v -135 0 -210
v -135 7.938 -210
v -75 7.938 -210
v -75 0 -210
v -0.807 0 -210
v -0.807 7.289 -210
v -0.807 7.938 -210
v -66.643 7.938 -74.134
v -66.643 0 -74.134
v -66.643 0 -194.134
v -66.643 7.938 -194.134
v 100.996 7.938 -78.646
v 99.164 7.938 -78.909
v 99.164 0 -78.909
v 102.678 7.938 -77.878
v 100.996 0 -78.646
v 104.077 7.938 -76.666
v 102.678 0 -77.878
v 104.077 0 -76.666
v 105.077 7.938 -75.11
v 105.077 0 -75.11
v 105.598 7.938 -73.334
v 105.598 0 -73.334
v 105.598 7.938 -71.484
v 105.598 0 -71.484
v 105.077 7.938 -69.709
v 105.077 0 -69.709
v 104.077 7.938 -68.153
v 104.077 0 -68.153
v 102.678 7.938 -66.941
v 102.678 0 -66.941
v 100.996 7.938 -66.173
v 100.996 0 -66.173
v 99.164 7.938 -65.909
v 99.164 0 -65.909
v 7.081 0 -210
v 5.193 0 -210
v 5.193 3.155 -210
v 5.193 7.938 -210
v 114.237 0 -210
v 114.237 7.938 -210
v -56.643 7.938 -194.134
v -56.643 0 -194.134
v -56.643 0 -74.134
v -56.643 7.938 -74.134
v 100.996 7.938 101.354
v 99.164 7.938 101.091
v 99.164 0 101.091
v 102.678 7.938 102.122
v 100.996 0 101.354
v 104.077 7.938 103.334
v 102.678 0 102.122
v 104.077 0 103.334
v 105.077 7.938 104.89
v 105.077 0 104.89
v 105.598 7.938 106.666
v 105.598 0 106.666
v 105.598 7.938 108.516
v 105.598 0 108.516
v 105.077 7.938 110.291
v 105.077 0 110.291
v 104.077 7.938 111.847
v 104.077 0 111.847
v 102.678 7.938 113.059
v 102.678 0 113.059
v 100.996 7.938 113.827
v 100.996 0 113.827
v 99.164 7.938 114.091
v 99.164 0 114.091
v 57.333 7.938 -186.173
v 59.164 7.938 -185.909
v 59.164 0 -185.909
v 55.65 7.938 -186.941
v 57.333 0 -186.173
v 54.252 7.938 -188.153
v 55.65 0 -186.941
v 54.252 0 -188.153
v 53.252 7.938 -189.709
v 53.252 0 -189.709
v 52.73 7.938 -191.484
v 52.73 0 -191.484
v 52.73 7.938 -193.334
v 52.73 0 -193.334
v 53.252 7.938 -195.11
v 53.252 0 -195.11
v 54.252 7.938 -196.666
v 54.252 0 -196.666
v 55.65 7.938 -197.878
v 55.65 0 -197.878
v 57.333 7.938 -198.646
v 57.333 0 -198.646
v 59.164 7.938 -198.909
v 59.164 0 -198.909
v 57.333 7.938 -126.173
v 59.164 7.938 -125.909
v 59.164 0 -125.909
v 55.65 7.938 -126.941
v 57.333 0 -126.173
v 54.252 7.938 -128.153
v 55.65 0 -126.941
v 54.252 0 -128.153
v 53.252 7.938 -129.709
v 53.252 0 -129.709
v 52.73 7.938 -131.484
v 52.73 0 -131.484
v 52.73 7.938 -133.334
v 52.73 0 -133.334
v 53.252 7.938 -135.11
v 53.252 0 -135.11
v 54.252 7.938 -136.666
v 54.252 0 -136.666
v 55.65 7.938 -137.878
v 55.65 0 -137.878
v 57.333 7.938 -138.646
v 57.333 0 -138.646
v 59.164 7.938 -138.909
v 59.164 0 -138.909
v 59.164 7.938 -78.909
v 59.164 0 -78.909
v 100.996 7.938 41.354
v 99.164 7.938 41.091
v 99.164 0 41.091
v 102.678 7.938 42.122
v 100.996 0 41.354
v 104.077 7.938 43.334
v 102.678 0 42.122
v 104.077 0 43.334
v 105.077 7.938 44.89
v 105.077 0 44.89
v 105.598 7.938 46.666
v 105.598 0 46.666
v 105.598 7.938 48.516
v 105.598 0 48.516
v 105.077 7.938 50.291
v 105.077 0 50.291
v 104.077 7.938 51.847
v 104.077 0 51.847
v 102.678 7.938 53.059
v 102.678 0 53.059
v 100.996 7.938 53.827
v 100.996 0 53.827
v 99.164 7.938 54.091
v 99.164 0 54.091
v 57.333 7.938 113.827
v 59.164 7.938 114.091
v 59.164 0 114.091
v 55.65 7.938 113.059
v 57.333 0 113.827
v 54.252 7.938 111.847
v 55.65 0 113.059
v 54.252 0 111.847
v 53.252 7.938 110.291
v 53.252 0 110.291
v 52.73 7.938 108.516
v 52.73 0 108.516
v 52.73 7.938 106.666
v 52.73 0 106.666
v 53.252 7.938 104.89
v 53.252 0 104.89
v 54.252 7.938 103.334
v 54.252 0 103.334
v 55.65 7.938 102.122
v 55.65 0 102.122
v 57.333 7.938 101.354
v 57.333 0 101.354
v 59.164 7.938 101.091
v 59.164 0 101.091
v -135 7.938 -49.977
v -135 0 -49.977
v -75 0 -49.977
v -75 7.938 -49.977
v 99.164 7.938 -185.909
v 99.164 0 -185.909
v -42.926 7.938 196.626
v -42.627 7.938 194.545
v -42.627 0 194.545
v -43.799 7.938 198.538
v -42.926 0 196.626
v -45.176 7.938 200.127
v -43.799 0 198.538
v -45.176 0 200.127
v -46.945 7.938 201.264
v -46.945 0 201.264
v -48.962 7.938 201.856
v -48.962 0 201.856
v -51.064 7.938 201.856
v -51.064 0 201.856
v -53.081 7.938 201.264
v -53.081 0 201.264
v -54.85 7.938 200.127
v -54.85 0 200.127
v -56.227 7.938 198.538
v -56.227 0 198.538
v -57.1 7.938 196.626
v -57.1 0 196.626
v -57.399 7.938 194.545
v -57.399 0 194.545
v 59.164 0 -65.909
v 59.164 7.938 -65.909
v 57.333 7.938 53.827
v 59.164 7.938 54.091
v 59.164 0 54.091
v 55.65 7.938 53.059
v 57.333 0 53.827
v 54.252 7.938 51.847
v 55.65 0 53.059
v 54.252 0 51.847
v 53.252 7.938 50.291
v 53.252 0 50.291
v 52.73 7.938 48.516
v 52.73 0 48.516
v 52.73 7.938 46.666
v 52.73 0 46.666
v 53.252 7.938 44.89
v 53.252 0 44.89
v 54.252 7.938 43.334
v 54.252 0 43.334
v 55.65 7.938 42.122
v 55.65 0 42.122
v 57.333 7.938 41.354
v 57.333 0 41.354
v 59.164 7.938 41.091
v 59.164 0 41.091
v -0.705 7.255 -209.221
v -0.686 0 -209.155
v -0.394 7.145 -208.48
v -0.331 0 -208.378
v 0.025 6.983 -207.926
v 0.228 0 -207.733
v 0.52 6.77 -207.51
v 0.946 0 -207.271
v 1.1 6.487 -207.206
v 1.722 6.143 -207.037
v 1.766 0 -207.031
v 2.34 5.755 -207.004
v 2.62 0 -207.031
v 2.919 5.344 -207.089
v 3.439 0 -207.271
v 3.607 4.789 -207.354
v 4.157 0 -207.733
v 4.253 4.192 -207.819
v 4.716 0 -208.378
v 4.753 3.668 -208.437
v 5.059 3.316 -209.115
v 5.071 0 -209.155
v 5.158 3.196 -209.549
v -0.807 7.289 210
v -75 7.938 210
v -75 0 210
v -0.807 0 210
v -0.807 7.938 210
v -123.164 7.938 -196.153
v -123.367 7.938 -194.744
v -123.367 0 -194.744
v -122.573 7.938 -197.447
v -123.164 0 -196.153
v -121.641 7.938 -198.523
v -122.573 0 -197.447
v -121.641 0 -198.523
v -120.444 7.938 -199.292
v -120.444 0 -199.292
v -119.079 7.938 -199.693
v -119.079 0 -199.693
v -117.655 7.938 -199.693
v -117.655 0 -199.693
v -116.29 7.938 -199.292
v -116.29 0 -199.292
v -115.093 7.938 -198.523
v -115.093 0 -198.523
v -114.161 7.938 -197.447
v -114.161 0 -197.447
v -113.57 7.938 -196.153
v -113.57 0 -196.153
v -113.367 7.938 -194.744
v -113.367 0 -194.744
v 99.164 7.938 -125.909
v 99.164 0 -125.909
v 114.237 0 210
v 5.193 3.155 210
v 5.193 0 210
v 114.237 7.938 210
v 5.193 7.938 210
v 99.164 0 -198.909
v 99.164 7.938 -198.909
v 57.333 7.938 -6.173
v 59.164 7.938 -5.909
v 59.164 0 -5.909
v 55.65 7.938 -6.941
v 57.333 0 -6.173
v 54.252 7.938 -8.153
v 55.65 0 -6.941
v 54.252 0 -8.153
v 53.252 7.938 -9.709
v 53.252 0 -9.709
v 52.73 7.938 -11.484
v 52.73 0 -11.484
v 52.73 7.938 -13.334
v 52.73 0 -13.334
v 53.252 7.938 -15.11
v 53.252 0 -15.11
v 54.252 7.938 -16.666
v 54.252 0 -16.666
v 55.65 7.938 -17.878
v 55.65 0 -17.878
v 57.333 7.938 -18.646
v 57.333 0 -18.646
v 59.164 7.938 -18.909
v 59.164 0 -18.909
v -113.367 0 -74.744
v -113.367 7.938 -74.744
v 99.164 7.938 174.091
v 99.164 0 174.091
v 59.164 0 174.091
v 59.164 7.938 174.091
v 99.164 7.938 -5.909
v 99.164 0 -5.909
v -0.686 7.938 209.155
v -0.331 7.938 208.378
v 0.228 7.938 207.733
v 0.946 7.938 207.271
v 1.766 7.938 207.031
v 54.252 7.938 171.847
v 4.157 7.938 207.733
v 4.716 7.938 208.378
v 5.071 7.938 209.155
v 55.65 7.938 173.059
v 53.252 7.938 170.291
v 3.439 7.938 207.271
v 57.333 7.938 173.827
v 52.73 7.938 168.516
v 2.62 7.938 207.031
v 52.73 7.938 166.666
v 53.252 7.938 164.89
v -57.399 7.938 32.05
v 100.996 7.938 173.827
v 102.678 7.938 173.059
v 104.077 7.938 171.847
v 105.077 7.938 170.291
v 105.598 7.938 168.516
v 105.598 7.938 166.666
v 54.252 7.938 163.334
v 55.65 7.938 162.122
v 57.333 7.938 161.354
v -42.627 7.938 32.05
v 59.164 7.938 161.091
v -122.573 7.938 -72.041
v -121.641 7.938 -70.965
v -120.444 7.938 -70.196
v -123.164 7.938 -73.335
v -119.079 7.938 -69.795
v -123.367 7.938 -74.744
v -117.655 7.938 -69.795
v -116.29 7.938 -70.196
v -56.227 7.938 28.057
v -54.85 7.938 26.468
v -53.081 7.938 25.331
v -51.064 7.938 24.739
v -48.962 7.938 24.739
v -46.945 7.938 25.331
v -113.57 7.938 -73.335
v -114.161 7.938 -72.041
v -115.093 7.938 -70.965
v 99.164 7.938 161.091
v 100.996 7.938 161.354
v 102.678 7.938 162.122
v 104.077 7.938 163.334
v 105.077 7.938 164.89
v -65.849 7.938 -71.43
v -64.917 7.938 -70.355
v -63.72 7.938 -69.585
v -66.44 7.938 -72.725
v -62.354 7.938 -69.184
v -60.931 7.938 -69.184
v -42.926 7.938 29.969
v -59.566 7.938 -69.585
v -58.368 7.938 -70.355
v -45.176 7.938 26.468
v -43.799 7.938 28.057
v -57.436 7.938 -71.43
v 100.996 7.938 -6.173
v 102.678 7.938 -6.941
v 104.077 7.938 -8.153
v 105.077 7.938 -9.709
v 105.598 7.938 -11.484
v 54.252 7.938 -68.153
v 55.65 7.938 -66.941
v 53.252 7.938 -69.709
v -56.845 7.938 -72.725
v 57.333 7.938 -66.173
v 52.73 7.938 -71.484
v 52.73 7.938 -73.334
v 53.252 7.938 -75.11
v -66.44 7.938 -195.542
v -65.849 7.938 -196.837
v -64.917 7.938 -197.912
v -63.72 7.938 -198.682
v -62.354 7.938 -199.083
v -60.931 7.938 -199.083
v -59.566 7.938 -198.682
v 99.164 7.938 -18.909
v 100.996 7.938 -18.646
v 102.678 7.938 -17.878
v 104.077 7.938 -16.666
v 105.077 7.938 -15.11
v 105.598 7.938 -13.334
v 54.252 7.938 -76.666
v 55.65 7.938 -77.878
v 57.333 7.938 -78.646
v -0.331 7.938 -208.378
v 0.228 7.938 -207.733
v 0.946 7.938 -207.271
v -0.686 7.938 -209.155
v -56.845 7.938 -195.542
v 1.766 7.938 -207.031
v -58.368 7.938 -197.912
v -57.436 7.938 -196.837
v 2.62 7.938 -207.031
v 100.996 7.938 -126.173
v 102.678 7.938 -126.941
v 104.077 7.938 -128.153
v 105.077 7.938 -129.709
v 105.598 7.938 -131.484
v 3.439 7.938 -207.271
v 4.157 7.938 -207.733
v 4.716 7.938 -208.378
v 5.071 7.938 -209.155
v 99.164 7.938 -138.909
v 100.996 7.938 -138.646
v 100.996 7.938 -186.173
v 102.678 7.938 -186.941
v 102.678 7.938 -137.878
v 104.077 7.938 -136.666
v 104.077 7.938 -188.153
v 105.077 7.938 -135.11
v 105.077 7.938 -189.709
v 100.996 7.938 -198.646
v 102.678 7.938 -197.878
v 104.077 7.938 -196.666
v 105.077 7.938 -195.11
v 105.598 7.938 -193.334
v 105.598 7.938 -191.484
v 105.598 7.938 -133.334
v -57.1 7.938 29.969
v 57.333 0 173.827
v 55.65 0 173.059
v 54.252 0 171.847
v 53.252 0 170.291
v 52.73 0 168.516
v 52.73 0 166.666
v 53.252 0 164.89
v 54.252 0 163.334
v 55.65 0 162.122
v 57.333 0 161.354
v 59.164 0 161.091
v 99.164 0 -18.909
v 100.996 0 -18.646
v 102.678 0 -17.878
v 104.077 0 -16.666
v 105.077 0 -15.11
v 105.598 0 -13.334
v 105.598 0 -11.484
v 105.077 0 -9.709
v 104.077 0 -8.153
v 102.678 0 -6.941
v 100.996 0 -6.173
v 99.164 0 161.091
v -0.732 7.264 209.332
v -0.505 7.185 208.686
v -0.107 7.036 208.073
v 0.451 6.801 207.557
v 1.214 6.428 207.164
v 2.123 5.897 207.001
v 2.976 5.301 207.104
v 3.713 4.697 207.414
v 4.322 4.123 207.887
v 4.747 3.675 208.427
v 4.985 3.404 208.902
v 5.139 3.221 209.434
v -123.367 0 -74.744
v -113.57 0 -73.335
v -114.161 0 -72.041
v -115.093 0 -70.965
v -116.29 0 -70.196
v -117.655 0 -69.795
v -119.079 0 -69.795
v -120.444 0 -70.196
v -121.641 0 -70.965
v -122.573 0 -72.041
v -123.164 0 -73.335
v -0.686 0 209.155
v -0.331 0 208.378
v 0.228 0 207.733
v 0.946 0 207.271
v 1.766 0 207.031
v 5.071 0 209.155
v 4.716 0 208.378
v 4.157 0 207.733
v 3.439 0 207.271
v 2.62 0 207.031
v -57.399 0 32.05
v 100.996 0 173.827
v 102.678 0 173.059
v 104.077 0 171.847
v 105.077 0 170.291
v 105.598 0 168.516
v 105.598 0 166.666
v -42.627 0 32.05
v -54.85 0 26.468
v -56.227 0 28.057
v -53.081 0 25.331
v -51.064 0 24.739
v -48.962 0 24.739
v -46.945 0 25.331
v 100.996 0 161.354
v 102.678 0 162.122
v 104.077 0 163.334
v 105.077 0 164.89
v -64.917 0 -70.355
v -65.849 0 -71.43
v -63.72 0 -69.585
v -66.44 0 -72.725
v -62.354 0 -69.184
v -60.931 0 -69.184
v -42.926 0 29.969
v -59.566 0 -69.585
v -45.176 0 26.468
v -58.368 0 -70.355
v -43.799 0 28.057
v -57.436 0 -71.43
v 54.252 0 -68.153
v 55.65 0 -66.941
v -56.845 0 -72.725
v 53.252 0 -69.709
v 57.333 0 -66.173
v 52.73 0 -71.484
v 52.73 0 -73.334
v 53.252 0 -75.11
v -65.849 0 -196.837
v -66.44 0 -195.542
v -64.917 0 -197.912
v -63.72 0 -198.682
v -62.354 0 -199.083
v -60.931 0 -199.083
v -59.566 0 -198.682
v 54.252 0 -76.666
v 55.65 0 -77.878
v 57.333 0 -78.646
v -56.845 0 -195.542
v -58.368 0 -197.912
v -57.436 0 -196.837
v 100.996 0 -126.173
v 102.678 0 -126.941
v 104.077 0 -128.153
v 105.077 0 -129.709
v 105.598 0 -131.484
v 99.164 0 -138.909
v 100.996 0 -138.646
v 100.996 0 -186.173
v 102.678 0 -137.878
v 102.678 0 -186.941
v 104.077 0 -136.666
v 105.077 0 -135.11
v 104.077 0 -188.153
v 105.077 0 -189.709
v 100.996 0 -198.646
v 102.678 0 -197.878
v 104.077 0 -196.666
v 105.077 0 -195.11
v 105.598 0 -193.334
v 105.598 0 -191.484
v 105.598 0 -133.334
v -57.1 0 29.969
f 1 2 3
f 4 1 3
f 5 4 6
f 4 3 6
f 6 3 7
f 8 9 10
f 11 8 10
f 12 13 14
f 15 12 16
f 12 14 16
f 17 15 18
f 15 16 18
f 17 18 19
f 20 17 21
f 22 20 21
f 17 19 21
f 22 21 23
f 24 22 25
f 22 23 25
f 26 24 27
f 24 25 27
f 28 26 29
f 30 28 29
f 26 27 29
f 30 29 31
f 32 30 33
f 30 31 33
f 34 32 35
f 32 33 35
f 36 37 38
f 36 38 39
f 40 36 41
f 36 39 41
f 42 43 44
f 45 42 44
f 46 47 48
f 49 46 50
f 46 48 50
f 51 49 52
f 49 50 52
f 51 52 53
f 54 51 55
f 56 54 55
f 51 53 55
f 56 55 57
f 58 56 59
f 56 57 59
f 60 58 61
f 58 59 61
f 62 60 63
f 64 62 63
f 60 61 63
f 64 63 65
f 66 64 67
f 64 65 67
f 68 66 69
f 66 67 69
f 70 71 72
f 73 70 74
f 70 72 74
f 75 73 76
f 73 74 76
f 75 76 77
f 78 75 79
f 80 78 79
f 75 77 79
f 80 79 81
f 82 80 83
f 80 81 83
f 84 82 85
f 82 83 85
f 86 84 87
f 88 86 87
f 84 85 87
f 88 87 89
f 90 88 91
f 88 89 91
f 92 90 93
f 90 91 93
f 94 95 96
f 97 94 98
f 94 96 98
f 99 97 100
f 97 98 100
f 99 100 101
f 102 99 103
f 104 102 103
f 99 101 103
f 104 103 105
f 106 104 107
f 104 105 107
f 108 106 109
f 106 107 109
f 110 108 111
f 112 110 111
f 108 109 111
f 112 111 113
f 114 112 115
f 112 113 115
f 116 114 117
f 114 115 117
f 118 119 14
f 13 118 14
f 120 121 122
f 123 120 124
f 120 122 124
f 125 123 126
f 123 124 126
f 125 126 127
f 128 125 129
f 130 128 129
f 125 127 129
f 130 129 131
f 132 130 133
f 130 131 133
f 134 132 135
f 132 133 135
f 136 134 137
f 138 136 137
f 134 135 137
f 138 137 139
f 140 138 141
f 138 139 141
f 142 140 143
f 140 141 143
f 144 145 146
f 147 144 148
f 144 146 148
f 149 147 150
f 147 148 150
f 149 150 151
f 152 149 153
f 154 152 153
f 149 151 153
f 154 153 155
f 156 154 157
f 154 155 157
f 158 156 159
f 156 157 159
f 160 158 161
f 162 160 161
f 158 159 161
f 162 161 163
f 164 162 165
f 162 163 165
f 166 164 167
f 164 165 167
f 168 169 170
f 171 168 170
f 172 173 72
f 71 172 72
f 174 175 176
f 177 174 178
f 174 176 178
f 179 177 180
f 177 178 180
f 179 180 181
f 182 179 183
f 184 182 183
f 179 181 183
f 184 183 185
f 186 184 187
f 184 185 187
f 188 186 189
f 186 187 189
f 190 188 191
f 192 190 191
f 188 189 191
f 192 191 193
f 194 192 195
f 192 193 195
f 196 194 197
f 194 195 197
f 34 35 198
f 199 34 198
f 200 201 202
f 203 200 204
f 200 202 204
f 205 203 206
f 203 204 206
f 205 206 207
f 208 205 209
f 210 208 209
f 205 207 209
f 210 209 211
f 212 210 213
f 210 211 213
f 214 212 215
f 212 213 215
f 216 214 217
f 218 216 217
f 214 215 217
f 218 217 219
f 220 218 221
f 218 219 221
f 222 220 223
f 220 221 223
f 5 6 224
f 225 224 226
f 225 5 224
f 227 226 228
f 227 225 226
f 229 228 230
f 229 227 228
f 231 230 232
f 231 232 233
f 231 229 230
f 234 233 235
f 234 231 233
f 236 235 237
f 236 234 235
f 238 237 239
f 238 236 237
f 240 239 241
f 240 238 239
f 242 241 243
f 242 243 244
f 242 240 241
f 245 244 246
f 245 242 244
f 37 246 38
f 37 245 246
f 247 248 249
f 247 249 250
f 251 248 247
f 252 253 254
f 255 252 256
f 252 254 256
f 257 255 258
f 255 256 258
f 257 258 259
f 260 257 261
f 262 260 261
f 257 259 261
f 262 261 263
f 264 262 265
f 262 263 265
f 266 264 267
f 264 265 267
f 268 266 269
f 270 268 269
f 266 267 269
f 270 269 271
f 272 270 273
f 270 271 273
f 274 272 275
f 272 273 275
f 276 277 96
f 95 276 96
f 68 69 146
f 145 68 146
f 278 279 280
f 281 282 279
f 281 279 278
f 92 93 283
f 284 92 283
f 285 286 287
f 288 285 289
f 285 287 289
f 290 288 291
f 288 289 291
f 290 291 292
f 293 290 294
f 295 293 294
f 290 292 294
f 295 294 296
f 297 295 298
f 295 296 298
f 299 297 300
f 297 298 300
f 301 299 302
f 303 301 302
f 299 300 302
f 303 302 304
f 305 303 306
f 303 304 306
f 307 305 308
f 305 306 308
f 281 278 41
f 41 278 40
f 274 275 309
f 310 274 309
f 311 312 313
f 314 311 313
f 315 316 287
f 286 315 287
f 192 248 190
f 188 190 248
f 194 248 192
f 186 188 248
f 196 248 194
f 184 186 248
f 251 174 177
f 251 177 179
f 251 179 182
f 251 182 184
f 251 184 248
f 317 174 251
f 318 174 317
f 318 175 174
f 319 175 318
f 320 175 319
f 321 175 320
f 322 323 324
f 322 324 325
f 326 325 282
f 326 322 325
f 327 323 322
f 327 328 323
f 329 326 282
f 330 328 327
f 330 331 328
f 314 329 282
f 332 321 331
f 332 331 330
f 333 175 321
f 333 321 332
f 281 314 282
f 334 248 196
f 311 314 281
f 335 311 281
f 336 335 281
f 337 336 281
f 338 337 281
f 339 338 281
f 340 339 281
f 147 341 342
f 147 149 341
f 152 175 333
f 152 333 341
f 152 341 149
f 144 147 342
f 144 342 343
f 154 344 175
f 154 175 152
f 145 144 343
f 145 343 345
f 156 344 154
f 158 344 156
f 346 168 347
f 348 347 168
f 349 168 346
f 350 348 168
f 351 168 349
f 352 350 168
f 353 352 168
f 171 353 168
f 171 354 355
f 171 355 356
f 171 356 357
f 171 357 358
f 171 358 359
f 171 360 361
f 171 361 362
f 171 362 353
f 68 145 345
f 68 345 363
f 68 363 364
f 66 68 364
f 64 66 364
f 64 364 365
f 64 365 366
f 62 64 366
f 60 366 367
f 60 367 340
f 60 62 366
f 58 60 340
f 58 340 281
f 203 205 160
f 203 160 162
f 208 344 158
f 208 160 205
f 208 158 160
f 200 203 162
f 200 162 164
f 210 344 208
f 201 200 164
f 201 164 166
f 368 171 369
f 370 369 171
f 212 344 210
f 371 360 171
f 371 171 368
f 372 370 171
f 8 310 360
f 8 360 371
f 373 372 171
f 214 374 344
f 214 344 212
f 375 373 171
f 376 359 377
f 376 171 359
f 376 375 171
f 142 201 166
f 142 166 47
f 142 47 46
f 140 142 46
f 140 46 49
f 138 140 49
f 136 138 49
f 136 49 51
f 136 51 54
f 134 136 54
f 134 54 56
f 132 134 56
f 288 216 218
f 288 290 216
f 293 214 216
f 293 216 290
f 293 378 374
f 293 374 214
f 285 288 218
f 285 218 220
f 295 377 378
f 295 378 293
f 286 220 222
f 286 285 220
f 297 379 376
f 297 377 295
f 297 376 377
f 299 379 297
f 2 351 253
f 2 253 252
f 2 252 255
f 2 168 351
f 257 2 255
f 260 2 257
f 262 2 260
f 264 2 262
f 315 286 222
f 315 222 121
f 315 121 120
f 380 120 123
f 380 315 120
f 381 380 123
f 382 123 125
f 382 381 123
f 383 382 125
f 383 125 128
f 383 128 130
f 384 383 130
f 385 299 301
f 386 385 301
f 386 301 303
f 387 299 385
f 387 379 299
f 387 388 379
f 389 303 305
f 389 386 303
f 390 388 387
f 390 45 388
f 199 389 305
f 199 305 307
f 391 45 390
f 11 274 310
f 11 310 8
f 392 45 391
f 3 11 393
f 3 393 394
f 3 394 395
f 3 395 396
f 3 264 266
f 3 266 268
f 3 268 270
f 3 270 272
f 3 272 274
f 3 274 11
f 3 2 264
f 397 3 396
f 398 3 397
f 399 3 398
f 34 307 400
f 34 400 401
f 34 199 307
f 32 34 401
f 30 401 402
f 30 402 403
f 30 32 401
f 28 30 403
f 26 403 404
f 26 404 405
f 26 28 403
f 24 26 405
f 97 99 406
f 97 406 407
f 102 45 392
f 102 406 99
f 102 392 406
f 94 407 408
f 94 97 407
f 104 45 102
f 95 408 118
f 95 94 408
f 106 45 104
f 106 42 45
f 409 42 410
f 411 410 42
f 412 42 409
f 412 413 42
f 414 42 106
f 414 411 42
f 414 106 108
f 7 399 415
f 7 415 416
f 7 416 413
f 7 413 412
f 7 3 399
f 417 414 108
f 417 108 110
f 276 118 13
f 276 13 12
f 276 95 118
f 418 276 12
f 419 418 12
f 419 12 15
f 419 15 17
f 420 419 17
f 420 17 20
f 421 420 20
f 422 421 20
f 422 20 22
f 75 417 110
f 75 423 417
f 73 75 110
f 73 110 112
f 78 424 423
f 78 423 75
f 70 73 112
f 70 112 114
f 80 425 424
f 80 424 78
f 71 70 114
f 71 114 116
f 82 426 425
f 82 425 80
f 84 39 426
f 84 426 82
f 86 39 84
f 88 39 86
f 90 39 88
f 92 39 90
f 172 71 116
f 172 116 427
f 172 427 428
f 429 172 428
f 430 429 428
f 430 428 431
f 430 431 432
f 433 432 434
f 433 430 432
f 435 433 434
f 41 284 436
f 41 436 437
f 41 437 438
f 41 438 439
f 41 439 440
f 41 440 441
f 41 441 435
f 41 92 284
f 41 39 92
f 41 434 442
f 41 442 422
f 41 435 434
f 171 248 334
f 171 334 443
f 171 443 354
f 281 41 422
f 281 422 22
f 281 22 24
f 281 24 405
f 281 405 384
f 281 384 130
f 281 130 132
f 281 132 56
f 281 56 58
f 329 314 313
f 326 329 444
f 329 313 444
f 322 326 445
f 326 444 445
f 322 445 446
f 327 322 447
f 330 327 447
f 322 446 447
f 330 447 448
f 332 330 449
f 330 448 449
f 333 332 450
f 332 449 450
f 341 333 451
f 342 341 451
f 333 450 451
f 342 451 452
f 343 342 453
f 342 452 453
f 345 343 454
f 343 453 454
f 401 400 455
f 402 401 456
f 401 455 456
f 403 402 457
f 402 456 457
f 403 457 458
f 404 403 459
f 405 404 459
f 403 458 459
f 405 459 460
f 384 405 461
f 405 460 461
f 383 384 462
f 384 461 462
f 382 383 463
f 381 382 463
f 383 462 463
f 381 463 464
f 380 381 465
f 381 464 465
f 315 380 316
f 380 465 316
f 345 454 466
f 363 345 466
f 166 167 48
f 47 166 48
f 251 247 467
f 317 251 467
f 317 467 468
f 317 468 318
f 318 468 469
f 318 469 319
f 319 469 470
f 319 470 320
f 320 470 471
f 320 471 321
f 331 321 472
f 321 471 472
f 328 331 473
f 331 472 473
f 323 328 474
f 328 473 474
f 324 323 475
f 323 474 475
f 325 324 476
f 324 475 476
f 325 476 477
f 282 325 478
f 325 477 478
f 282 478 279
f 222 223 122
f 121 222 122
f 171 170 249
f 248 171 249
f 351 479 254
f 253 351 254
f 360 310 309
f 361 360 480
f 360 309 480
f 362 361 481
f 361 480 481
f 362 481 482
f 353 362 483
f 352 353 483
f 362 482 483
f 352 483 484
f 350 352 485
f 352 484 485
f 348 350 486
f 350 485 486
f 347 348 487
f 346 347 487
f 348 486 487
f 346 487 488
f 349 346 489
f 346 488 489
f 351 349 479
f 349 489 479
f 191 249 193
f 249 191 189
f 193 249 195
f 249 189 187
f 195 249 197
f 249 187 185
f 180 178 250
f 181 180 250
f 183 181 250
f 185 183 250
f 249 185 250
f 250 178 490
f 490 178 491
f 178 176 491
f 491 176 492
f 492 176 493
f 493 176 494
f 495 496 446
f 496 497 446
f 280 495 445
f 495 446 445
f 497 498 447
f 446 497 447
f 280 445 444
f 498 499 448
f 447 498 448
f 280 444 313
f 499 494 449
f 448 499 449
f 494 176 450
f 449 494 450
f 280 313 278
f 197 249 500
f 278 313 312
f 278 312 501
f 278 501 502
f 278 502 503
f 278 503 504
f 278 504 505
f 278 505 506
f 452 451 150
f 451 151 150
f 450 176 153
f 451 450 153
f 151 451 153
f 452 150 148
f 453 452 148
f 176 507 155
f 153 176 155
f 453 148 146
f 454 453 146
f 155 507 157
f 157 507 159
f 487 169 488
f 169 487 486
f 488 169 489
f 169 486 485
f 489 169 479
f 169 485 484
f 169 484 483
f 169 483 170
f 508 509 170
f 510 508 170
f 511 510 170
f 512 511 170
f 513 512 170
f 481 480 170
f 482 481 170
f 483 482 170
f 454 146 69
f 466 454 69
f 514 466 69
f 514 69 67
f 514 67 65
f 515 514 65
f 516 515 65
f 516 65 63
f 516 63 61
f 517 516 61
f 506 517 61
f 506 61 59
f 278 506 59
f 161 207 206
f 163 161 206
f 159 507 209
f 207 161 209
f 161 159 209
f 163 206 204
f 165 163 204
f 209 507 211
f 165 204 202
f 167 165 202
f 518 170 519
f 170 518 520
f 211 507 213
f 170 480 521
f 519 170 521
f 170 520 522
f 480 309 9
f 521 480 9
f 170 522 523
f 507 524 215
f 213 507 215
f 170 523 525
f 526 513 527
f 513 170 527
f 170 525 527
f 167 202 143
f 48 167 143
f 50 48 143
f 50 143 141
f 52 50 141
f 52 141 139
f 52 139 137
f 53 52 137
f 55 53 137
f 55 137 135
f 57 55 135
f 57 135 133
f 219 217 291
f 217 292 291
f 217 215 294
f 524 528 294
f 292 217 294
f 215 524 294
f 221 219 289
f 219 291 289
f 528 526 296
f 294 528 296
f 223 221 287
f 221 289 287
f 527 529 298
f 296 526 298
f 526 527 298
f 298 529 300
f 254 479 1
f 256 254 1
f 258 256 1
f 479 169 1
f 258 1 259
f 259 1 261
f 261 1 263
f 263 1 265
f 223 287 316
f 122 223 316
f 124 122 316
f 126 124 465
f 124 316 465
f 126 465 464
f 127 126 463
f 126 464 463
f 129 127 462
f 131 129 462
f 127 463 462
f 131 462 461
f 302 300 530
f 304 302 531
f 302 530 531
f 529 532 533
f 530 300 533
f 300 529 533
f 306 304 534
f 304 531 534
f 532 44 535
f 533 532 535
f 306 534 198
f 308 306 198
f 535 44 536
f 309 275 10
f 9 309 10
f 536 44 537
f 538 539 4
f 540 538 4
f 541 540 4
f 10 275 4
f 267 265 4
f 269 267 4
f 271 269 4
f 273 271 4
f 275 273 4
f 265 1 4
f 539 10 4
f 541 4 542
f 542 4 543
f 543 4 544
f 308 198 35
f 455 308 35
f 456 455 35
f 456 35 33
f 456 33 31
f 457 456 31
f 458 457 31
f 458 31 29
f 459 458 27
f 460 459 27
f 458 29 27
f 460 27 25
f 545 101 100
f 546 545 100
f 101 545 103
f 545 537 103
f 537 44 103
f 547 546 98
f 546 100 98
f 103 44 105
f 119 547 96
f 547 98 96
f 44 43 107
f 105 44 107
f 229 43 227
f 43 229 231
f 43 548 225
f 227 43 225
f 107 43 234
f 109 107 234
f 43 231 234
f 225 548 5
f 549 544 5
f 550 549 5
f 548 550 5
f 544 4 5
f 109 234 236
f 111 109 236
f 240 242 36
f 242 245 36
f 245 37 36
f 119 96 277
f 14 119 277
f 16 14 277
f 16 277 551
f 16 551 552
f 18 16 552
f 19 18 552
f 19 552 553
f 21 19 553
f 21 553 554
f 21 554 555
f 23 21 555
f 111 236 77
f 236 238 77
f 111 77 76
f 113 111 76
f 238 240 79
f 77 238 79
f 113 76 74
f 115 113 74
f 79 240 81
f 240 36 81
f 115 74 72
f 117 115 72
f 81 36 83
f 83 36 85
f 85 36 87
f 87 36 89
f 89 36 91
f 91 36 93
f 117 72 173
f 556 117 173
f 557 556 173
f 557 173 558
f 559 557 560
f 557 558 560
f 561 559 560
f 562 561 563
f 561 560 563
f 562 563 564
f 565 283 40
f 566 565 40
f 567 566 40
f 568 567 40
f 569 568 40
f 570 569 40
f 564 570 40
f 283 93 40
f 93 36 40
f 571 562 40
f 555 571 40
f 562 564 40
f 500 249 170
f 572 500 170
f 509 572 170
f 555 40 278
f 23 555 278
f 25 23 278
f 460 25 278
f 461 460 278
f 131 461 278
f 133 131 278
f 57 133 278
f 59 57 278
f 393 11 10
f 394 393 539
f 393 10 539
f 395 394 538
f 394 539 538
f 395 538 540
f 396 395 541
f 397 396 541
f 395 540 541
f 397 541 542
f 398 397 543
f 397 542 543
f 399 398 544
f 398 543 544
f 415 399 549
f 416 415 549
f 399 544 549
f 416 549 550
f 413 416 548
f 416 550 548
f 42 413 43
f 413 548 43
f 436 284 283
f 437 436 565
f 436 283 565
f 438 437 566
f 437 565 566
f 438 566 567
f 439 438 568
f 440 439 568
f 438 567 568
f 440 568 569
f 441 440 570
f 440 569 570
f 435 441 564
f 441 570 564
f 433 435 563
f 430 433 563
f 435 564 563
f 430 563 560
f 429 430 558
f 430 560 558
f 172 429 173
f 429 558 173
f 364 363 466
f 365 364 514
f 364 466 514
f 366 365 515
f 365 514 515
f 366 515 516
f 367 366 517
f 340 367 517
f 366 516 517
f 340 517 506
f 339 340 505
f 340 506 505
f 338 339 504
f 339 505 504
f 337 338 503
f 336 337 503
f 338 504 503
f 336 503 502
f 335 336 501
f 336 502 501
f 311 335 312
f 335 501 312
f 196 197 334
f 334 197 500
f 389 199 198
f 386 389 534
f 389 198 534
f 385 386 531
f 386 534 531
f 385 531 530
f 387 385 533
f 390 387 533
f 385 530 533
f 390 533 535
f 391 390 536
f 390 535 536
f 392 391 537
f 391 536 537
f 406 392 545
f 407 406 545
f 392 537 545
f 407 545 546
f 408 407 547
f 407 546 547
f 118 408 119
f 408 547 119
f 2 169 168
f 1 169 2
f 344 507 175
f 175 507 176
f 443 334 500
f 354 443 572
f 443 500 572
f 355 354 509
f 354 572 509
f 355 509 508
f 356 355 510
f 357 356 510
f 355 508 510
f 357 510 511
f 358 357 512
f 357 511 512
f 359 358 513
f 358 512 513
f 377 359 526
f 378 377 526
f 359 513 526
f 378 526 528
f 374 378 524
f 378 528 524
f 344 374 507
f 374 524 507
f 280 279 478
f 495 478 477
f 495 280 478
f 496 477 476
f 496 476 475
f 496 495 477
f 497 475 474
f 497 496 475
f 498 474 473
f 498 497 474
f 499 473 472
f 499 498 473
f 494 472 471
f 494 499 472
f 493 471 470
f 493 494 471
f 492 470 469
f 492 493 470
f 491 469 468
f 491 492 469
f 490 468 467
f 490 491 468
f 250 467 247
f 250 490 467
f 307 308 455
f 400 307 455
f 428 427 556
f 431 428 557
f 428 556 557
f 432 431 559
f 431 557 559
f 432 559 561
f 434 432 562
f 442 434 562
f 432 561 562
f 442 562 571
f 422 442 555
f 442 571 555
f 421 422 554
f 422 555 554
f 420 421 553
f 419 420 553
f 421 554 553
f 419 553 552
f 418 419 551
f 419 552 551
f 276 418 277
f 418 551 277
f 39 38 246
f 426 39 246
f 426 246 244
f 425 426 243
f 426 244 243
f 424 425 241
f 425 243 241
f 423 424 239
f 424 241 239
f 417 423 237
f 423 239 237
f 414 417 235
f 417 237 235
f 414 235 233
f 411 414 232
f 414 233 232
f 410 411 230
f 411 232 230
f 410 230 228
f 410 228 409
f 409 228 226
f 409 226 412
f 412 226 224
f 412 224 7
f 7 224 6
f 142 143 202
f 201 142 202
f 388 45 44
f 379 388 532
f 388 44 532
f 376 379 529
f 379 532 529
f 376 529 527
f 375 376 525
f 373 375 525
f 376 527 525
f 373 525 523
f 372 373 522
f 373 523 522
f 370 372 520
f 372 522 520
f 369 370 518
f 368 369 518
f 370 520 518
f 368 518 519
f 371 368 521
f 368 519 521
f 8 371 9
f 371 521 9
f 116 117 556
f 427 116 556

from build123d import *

# Parameters (mm, degrees)
CROQUIS1_W                = 60
CROQUIS1_H                = 160.023288417
SALIENTE_EXTRUIR1_DEPTH   = 7.9375
CROQUIS2_W                = 8.086078182
CROQUIS2_H                = 420
SALIENTE_EXTRUIR2_DEPTH   = 110
CORTAR_EXTRUIR1_DEPTH     = 10
CROQUIS4_W                = 184.389639933
CROQUIS4_H                = 520.028204804
CORTAR_EXTRUIR2_DEPTH     = 10
CONVERTIR_S_LIDO1_START   = -210
CONVERTIR_S_LIDO1_DEPTH   = 420
CONVERTIR_S_LIDO1_2_DEPTH = 420
CORTAR_EXTRUIR3_START     = -117.9375
CORTAR_EXTRUIR3_OUTLINE_W = 14.086078182
CORTAR_EXTRUIR3_OUTLINE_H = 420
CORTAR_EXTRUIR3_DEPTH     = 110
CORTAR_EXTRUIR3_START_2   = -7.9375
CORTAR_EXTRUIR3_2_DEPTH   = 7.9375
CORTAR_EXTRUIR3_3_DEPTH   = 7.9375


# Read off the part's stored shape, not the designer's step: Convertir-Sólido1, Cortar-Extruir3
with BuildPart() as part:
    # Croquis1 → Saliente-Extruir1 (new body)
    # profile 1 of 2: a face of its own
    with BuildSketch(Plane(origin=(0, 0, 0), x_dir=(1, 0, 0), z_dir=(0, 1, 0))):
        Polygon((75, 210), (-75, 210), (-75, 49.976711583), (-75, -210), (75, -210), align=None)
        with BuildLine():
            Line((-57.399097033, -162.050045053), (-57.399097033, -64.544827159))
            Line((-57.399097033, -64.544827159), (-57.399097033, -32.050045053))
            ThreePointArc((-57.399097033, -32.050045053), (-50.012947046, -24.663895066), (-42.626797059, -32.050045053))
            Line((-42.626797059, -32.050045053), (-42.626797059, -64.544827159))
            Line((-42.626797059, -64.544827159), (-42.626797059, -162.050045053))
            Line((-42.626797059, -162.050045053), (-42.626797059, -194.544827159))
            ThreePointArc((-42.626797059, -194.544827159), (-50.012947046, -201.930977146), (-57.399097033, -194.544827159))
            Line((-57.399097033, -194.544827159), (-57.399097033, -162.050045053))
        make_face(mode=Mode.SUBTRACT)
        with BuildLine():
            ThreePointArc((57.373202941, -194.544827159), (49.987052954, -201.930977146), (42.600902967, -194.544827159))
            Line((42.600902967, -194.544827159), (42.600902967, -162.050045053))
            ThreePointArc((42.600902967, -162.050045053), (49.987052954, -154.663895066), (57.373202941, -162.050045053))
            Line((57.373202941, -162.050045053), (57.373202941, -194.544827159))
        make_face(mode=Mode.SUBTRACT)
        with BuildLine():
            ThreePointArc((57.373202941, -64.544827159), (49.987052954, -71.930977146), (42.600902967, -64.544827159))
            Line((42.600902967, -64.544827159), (42.600902967, -32.050045053))
            ThreePointArc((42.600902967, -32.050045053), (49.987052954, -24.663895066), (57.373202941, -32.050045053))
            Line((57.373202941, -32.050045053), (57.373202941, -64.544827159))
        make_face(mode=Mode.SUBTRACT)
        with BuildLine():
            ThreePointArc((-66.642728039, 194.133584854), (-61.642728039, 199.133584854), (-56.642728039, 194.133584854))
            Line((-56.642728039, 194.133584854), (-56.642728039, 74.133584854))
            ThreePointArc((-56.642728039, 74.133584854), (-61.642728039, 69.133584854), (-66.642728039, 74.133584854))
            Line((-66.642728039, 74.133584854), (-66.642728039, 194.133584854))
        make_face(mode=Mode.SUBTRACT)
    # profile 2 of 2: a face of its own
    with BuildSketch(Plane(origin=(0, 0, 0), x_dir=(1, 0, 0), z_dir=(0, 1, 0))):
        with Locations((-105, 129.988355791)):
            Rectangle(CROQUIS1_W, CROQUIS1_H)
        with BuildLine():
            ThreePointArc((-123.366972213, 194.743931483), (-118.366972213, 199.743931483), (-113.366972213, 194.743931483))
            Line((-113.366972213, 194.743931483), (-113.366972213, 74.743931483))
            ThreePointArc((-113.366972213, 74.743931483), (-118.366972213, 69.743931483), (-123.366972213, 74.743931483))
            Line((-123.366972213, 74.743931483), (-123.366972213, 194.743931483))
        make_face(mode=Mode.SUBTRACT)
    extrude(amount=SALIENTE_EXTRUIR1_DEPTH)

    # Croquis2 → Saliente-Extruir2 (add)
    with BuildSketch(Plane.XZ):
        with Locations((4.043039091, 0)):
            Rectangle(CROQUIS2_W, CROQUIS2_H)
    extrude(amount=SALIENTE_EXTRUIR2_DEPTH)

    # Croquis3 → Cortar-Extruir1 (cut)
    with BuildSketch(Plane.ZY):
        with BuildLine():
            Line((-185.90944112, -54.927638628), (-185.90944112, -94.927638628))
            ThreePointArc((-185.90944112, -94.927638628), (-192.40944112, -101.427638628), (-198.90944112, -94.927638628))
            Line((-198.90944112, -94.927638628), (-198.90944112, -54.927638628))
            ThreePointArc((-198.90944112, -54.927638628), (-192.40944112, -48.427638628), (-185.90944112, -54.927638628))
        make_face()
        with BuildLine():
            Line((-125.90944112, -54.927638628), (-125.90944112, -94.927638628))
            ThreePointArc((-125.90944112, -94.927638628), (-132.40944112, -101.427638628), (-138.90944112, -94.927638628))
            Line((-138.90944112, -94.927638628), (-138.90944112, -54.927638628))
            ThreePointArc((-138.90944112, -54.927638628), (-132.40944112, -48.427638628), (-125.90944112, -54.927638628))
        make_face()
        with BuildLine():
            Line((-65.90944112, -54.927638628), (-65.90944112, -94.927638628))
            ThreePointArc((-65.90944112, -94.927638628), (-72.40944112, -101.427638628), (-78.90944112, -94.927638628))
            Line((-78.90944112, -94.927638628), (-78.90944112, -54.927638628))
            ThreePointArc((-78.90944112, -54.927638628), (-72.40944112, -48.427638628), (-65.90944112, -54.927638628))
        make_face()
        with BuildLine():
            Line((-5.90944112, -54.927638628), (-5.90944112, -94.927638628))
            ThreePointArc((-5.90944112, -94.927638628), (-12.40944112, -101.427638628), (-18.90944112, -94.927638628))
            Line((-18.90944112, -94.927638628), (-18.90944112, -54.927638628))
            ThreePointArc((-18.90944112, -54.927638628), (-12.40944112, -48.427638628), (-5.90944112, -54.927638628))
        make_face()
        with BuildLine():
            Line((54.09055888, -54.927638628), (54.09055888, -94.927638628))
            ThreePointArc((54.09055888, -94.927638628), (47.59055888, -101.427638628), (41.09055888, -94.927638628))
            Line((41.09055888, -94.927638628), (41.09055888, -54.927638628))
            ThreePointArc((41.09055888, -54.927638628), (47.59055888, -48.427638628), (54.09055888, -54.927638628))
        make_face()
        with BuildLine():
            Line((114.09055888, -54.927638628), (114.09055888, -94.927638628))
            ThreePointArc((114.09055888, -94.927638628), (107.59055888, -101.427638628), (101.09055888, -94.927638628))
            Line((101.09055888, -94.927638628), (101.09055888, -54.927638628))
            ThreePointArc((101.09055888, -54.927638628), (107.59055888, -48.427638628), (114.09055888, -54.927638628))
        make_face()
        with BuildLine():
            Line((174.09055888, -54.927638628), (174.09055888, -94.927638628))
            ThreePointArc((174.09055888, -94.927638628), (167.59055888, -101.427638628), (161.09055888, -94.927638628))
            Line((161.09055888, -94.927638628), (161.09055888, -54.927638628))
            ThreePointArc((161.09055888, -54.927638628), (167.59055888, -48.427638628), (174.09055888, -54.927638628))
        make_face()
    extrude(amount=-CORTAR_EXTRUIR1_DEPTH, mode=Mode.SUBTRACT)

    # Croquis4 → Cortar-Extruir2 (cut)
    with BuildSketch(Plane.XZ):
        with Locations((100.280898149, 50.014102402)):
            Rectangle(CROQUIS4_W, CROQUIS4_H)
    extrude(amount=-CORTAR_EXTRUIR2_DEPTH, mode=Mode.SUBTRACT)

    # Convertir-Sólido1 outline → Convertir-Sólido1 (cut)
    with BuildSketch(Plane.XY.offset(CONVERTIR_S_LIDO1_START)):
        with BuildLine():
            Line((8.086078182, 7.9375), (-4.851421818, 7.9375))
            ThreePointArc((-4.851421818, 7.9375), (4.296772164, 4.148193982), (8.086078182, -5))
            Line((8.086078182, -5), (8.086078182, 7.9375))
        make_face()
        with BuildLine():
            Line((0, -110), (0.148578182, -110))
            Line((0.148578182, -110), (0.148578182, -5))
            ThreePointArc((0.148578182, -5), (0.11129463, -4.390536748), (0, -3.790162679))
            Line((0, -3.790162679), (0, -110))
        make_face()
    extrude(amount=CONVERTIR_S_LIDO1_DEPTH, mode=Mode.SUBTRACT)

    # Convertir-S_lido1 2 outline → Convertir-S_lido1 2 (add)
    with BuildSketch(Plane.XY.offset(CONVERTIR_S_LIDO1_START)):
        with BuildLine():
            ThreePointArc((-4.851421818, 0), (-1.773206962, -1.059873948), (0, -3.790162679))
            Line((0, -3.790162679), (0, 0))
            Line((0, 0), (-4.851421818, 0))
        make_face()
    extrude(amount=CONVERTIR_S_LIDO1_2_DEPTH)

    # Cortar-Extruir3 outline → Cortar-Extruir3 (cut)
    with BuildSketch(Plane(origin=(0, 7.9375, 0), x_dir=(1, 0, 0), z_dir=(0, 1, 0)).offset(CORTAR_EXTRUIR3_START)):
        with Locations((1.043039091, 0)):
            Rectangle(CORTAR_EXTRUIR3_OUTLINE_W, CORTAR_EXTRUIR3_OUTLINE_H)
    extrude(amount=CORTAR_EXTRUIR3_DEPTH, mode=Mode.SUBTRACT)

    # Cortar-Extruir3 2 outline → Cortar-Extruir3 2 (cut)
    with BuildSketch(Plane(origin=(0, 7.9375, 0), x_dir=(1, 0, 0), z_dir=(0, 1, 0)).offset(CORTAR_EXTRUIR3_START_2)):
        with BuildLine():
            Line((5.19261796, 210), (-0.80738204, 210))
            ThreePointArc((-0.80738204, 210), (2.19261796, 207), (5.19261796, 210))
        make_face()
        with BuildLine():
            Line((-0.80738204, -210), (5.19261796, -210))
            ThreePointArc((5.19261796, -210), (2.19261796, -207), (-0.80738204, -210))
        make_face()
    extrude(amount=CORTAR_EXTRUIR3_2_DEPTH, mode=Mode.SUBTRACT)

    # Cortar-Extruir3 3 outline → Cortar-Extruir3 3 (add)
    with BuildSketch(Plane(origin=(0, 7.9375, 0), x_dir=(1, 0, 0), z_dir=(0, 1, 0)).offset(CORTAR_EXTRUIR3_START_2)):
        with BuildLine():
            ThreePointArc((5.19261796, 210), (2.19261796, 207), (-0.80738204, 210))
            Line((-0.80738204, 210), (-6, 210))
            Line((-6, 210), (-6, -210))
            Line((-6, -210), (-0.80738204, -210))
            ThreePointArc((-0.80738204, -210), (2.19261796, -207), (5.19261796, -210))
            Line((5.19261796, -210), (114.236657738, -210))
            Line((114.236657738, -210), (114.236657738, 210))
            Line((114.236657738, 210), (5.19261796, 210))
        make_face()
        with BuildLine():
            Line((59.164296366, 198.90944112), (99.164296366, 198.90944112))
            ThreePointArc((99.164296366, 198.90944112), (105.664296366, 192.40944112), (99.164296366, 185.90944112))
            Line((99.164296366, 185.90944112), (59.164296366, 185.90944112))
            ThreePointArc((59.164296366, 185.90944112), (52.664296366, 192.40944112), (59.164296366, 198.90944112))
        make_face(mode=Mode.SUBTRACT)
        with BuildLine():
            Line((59.164296366, 138.90944112), (99.164296366, 138.90944112))
            ThreePointArc((99.164296366, 138.90944112), (105.664296366, 132.40944112), (99.164296366, 125.90944112))
            Line((99.164296366, 125.90944112), (59.164296366, 125.90944112))
            ThreePointArc((59.164296366, 125.90944112), (52.664296366, 132.40944112), (59.164296366, 138.90944112))
        make_face(mode=Mode.SUBTRACT)
        with BuildLine():
            Line((59.164296366, 78.90944112), (99.164296366, 78.90944112))
            ThreePointArc((99.164296366, 78.90944112), (105.664296366, 72.40944112), (99.164296366, 65.90944112))
            Line((99.164296366, 65.90944112), (59.164296366, 65.90944112))
            ThreePointArc((59.164296366, 65.90944112), (52.664296366, 72.40944112), (59.164296366, 78.90944112))
        make_face(mode=Mode.SUBTRACT)
        with BuildLine():
            Line((59.164296366, 18.90944112), (99.164296366, 18.90944112))
            ThreePointArc((99.164296366, 18.90944112), (105.664296366, 12.40944112), (99.164296366, 5.90944112))
            Line((99.164296366, 5.90944112), (59.164296366, 5.90944112))
            ThreePointArc((59.164296366, 5.90944112), (52.664296366, 12.40944112), (59.164296366, 18.90944112))
        make_face(mode=Mode.SUBTRACT)
        with BuildLine():
            Line((59.164296366, -41.09055888), (99.164296366, -41.09055888))
            ThreePointArc((99.164296366, -41.09055888), (105.664296366, -47.59055888), (99.164296366, -54.09055888))
            Line((99.164296366, -54.09055888), (59.164296366, -54.09055888))
            ThreePointArc((59.164296366, -54.09055888), (52.664296366, -47.59055888), (59.164296366, -41.09055888))
        make_face(mode=Mode.SUBTRACT)
        with BuildLine():
            Line((59.164296366, -101.09055888), (99.164296366, -101.09055888))
            ThreePointArc((99.164296366, -101.09055888), (105.664296366, -107.59055888), (99.164296366, -114.09055888))
            Line((99.164296366, -114.09055888), (59.164296366, -114.09055888))
            ThreePointArc((59.164296366, -114.09055888), (52.664296366, -107.59055888), (59.164296366, -101.09055888))
        make_face(mode=Mode.SUBTRACT)
        with BuildLine():
            Line((59.164296366, -161.09055888), (99.164296366, -161.09055888))
            ThreePointArc((99.164296366, -161.09055888), (105.664296366, -167.59055888), (99.164296366, -174.09055888))
            Line((99.164296366, -174.09055888), (59.164296366, -174.09055888))
            ThreePointArc((59.164296366, -174.09055888), (52.664296366, -167.59055888), (59.164296366, -161.09055888))
        make_face(mode=Mode.SUBTRACT)
    extrude(amount=CORTAR_EXTRUIR3_3_DEPTH)


solid = part.part
